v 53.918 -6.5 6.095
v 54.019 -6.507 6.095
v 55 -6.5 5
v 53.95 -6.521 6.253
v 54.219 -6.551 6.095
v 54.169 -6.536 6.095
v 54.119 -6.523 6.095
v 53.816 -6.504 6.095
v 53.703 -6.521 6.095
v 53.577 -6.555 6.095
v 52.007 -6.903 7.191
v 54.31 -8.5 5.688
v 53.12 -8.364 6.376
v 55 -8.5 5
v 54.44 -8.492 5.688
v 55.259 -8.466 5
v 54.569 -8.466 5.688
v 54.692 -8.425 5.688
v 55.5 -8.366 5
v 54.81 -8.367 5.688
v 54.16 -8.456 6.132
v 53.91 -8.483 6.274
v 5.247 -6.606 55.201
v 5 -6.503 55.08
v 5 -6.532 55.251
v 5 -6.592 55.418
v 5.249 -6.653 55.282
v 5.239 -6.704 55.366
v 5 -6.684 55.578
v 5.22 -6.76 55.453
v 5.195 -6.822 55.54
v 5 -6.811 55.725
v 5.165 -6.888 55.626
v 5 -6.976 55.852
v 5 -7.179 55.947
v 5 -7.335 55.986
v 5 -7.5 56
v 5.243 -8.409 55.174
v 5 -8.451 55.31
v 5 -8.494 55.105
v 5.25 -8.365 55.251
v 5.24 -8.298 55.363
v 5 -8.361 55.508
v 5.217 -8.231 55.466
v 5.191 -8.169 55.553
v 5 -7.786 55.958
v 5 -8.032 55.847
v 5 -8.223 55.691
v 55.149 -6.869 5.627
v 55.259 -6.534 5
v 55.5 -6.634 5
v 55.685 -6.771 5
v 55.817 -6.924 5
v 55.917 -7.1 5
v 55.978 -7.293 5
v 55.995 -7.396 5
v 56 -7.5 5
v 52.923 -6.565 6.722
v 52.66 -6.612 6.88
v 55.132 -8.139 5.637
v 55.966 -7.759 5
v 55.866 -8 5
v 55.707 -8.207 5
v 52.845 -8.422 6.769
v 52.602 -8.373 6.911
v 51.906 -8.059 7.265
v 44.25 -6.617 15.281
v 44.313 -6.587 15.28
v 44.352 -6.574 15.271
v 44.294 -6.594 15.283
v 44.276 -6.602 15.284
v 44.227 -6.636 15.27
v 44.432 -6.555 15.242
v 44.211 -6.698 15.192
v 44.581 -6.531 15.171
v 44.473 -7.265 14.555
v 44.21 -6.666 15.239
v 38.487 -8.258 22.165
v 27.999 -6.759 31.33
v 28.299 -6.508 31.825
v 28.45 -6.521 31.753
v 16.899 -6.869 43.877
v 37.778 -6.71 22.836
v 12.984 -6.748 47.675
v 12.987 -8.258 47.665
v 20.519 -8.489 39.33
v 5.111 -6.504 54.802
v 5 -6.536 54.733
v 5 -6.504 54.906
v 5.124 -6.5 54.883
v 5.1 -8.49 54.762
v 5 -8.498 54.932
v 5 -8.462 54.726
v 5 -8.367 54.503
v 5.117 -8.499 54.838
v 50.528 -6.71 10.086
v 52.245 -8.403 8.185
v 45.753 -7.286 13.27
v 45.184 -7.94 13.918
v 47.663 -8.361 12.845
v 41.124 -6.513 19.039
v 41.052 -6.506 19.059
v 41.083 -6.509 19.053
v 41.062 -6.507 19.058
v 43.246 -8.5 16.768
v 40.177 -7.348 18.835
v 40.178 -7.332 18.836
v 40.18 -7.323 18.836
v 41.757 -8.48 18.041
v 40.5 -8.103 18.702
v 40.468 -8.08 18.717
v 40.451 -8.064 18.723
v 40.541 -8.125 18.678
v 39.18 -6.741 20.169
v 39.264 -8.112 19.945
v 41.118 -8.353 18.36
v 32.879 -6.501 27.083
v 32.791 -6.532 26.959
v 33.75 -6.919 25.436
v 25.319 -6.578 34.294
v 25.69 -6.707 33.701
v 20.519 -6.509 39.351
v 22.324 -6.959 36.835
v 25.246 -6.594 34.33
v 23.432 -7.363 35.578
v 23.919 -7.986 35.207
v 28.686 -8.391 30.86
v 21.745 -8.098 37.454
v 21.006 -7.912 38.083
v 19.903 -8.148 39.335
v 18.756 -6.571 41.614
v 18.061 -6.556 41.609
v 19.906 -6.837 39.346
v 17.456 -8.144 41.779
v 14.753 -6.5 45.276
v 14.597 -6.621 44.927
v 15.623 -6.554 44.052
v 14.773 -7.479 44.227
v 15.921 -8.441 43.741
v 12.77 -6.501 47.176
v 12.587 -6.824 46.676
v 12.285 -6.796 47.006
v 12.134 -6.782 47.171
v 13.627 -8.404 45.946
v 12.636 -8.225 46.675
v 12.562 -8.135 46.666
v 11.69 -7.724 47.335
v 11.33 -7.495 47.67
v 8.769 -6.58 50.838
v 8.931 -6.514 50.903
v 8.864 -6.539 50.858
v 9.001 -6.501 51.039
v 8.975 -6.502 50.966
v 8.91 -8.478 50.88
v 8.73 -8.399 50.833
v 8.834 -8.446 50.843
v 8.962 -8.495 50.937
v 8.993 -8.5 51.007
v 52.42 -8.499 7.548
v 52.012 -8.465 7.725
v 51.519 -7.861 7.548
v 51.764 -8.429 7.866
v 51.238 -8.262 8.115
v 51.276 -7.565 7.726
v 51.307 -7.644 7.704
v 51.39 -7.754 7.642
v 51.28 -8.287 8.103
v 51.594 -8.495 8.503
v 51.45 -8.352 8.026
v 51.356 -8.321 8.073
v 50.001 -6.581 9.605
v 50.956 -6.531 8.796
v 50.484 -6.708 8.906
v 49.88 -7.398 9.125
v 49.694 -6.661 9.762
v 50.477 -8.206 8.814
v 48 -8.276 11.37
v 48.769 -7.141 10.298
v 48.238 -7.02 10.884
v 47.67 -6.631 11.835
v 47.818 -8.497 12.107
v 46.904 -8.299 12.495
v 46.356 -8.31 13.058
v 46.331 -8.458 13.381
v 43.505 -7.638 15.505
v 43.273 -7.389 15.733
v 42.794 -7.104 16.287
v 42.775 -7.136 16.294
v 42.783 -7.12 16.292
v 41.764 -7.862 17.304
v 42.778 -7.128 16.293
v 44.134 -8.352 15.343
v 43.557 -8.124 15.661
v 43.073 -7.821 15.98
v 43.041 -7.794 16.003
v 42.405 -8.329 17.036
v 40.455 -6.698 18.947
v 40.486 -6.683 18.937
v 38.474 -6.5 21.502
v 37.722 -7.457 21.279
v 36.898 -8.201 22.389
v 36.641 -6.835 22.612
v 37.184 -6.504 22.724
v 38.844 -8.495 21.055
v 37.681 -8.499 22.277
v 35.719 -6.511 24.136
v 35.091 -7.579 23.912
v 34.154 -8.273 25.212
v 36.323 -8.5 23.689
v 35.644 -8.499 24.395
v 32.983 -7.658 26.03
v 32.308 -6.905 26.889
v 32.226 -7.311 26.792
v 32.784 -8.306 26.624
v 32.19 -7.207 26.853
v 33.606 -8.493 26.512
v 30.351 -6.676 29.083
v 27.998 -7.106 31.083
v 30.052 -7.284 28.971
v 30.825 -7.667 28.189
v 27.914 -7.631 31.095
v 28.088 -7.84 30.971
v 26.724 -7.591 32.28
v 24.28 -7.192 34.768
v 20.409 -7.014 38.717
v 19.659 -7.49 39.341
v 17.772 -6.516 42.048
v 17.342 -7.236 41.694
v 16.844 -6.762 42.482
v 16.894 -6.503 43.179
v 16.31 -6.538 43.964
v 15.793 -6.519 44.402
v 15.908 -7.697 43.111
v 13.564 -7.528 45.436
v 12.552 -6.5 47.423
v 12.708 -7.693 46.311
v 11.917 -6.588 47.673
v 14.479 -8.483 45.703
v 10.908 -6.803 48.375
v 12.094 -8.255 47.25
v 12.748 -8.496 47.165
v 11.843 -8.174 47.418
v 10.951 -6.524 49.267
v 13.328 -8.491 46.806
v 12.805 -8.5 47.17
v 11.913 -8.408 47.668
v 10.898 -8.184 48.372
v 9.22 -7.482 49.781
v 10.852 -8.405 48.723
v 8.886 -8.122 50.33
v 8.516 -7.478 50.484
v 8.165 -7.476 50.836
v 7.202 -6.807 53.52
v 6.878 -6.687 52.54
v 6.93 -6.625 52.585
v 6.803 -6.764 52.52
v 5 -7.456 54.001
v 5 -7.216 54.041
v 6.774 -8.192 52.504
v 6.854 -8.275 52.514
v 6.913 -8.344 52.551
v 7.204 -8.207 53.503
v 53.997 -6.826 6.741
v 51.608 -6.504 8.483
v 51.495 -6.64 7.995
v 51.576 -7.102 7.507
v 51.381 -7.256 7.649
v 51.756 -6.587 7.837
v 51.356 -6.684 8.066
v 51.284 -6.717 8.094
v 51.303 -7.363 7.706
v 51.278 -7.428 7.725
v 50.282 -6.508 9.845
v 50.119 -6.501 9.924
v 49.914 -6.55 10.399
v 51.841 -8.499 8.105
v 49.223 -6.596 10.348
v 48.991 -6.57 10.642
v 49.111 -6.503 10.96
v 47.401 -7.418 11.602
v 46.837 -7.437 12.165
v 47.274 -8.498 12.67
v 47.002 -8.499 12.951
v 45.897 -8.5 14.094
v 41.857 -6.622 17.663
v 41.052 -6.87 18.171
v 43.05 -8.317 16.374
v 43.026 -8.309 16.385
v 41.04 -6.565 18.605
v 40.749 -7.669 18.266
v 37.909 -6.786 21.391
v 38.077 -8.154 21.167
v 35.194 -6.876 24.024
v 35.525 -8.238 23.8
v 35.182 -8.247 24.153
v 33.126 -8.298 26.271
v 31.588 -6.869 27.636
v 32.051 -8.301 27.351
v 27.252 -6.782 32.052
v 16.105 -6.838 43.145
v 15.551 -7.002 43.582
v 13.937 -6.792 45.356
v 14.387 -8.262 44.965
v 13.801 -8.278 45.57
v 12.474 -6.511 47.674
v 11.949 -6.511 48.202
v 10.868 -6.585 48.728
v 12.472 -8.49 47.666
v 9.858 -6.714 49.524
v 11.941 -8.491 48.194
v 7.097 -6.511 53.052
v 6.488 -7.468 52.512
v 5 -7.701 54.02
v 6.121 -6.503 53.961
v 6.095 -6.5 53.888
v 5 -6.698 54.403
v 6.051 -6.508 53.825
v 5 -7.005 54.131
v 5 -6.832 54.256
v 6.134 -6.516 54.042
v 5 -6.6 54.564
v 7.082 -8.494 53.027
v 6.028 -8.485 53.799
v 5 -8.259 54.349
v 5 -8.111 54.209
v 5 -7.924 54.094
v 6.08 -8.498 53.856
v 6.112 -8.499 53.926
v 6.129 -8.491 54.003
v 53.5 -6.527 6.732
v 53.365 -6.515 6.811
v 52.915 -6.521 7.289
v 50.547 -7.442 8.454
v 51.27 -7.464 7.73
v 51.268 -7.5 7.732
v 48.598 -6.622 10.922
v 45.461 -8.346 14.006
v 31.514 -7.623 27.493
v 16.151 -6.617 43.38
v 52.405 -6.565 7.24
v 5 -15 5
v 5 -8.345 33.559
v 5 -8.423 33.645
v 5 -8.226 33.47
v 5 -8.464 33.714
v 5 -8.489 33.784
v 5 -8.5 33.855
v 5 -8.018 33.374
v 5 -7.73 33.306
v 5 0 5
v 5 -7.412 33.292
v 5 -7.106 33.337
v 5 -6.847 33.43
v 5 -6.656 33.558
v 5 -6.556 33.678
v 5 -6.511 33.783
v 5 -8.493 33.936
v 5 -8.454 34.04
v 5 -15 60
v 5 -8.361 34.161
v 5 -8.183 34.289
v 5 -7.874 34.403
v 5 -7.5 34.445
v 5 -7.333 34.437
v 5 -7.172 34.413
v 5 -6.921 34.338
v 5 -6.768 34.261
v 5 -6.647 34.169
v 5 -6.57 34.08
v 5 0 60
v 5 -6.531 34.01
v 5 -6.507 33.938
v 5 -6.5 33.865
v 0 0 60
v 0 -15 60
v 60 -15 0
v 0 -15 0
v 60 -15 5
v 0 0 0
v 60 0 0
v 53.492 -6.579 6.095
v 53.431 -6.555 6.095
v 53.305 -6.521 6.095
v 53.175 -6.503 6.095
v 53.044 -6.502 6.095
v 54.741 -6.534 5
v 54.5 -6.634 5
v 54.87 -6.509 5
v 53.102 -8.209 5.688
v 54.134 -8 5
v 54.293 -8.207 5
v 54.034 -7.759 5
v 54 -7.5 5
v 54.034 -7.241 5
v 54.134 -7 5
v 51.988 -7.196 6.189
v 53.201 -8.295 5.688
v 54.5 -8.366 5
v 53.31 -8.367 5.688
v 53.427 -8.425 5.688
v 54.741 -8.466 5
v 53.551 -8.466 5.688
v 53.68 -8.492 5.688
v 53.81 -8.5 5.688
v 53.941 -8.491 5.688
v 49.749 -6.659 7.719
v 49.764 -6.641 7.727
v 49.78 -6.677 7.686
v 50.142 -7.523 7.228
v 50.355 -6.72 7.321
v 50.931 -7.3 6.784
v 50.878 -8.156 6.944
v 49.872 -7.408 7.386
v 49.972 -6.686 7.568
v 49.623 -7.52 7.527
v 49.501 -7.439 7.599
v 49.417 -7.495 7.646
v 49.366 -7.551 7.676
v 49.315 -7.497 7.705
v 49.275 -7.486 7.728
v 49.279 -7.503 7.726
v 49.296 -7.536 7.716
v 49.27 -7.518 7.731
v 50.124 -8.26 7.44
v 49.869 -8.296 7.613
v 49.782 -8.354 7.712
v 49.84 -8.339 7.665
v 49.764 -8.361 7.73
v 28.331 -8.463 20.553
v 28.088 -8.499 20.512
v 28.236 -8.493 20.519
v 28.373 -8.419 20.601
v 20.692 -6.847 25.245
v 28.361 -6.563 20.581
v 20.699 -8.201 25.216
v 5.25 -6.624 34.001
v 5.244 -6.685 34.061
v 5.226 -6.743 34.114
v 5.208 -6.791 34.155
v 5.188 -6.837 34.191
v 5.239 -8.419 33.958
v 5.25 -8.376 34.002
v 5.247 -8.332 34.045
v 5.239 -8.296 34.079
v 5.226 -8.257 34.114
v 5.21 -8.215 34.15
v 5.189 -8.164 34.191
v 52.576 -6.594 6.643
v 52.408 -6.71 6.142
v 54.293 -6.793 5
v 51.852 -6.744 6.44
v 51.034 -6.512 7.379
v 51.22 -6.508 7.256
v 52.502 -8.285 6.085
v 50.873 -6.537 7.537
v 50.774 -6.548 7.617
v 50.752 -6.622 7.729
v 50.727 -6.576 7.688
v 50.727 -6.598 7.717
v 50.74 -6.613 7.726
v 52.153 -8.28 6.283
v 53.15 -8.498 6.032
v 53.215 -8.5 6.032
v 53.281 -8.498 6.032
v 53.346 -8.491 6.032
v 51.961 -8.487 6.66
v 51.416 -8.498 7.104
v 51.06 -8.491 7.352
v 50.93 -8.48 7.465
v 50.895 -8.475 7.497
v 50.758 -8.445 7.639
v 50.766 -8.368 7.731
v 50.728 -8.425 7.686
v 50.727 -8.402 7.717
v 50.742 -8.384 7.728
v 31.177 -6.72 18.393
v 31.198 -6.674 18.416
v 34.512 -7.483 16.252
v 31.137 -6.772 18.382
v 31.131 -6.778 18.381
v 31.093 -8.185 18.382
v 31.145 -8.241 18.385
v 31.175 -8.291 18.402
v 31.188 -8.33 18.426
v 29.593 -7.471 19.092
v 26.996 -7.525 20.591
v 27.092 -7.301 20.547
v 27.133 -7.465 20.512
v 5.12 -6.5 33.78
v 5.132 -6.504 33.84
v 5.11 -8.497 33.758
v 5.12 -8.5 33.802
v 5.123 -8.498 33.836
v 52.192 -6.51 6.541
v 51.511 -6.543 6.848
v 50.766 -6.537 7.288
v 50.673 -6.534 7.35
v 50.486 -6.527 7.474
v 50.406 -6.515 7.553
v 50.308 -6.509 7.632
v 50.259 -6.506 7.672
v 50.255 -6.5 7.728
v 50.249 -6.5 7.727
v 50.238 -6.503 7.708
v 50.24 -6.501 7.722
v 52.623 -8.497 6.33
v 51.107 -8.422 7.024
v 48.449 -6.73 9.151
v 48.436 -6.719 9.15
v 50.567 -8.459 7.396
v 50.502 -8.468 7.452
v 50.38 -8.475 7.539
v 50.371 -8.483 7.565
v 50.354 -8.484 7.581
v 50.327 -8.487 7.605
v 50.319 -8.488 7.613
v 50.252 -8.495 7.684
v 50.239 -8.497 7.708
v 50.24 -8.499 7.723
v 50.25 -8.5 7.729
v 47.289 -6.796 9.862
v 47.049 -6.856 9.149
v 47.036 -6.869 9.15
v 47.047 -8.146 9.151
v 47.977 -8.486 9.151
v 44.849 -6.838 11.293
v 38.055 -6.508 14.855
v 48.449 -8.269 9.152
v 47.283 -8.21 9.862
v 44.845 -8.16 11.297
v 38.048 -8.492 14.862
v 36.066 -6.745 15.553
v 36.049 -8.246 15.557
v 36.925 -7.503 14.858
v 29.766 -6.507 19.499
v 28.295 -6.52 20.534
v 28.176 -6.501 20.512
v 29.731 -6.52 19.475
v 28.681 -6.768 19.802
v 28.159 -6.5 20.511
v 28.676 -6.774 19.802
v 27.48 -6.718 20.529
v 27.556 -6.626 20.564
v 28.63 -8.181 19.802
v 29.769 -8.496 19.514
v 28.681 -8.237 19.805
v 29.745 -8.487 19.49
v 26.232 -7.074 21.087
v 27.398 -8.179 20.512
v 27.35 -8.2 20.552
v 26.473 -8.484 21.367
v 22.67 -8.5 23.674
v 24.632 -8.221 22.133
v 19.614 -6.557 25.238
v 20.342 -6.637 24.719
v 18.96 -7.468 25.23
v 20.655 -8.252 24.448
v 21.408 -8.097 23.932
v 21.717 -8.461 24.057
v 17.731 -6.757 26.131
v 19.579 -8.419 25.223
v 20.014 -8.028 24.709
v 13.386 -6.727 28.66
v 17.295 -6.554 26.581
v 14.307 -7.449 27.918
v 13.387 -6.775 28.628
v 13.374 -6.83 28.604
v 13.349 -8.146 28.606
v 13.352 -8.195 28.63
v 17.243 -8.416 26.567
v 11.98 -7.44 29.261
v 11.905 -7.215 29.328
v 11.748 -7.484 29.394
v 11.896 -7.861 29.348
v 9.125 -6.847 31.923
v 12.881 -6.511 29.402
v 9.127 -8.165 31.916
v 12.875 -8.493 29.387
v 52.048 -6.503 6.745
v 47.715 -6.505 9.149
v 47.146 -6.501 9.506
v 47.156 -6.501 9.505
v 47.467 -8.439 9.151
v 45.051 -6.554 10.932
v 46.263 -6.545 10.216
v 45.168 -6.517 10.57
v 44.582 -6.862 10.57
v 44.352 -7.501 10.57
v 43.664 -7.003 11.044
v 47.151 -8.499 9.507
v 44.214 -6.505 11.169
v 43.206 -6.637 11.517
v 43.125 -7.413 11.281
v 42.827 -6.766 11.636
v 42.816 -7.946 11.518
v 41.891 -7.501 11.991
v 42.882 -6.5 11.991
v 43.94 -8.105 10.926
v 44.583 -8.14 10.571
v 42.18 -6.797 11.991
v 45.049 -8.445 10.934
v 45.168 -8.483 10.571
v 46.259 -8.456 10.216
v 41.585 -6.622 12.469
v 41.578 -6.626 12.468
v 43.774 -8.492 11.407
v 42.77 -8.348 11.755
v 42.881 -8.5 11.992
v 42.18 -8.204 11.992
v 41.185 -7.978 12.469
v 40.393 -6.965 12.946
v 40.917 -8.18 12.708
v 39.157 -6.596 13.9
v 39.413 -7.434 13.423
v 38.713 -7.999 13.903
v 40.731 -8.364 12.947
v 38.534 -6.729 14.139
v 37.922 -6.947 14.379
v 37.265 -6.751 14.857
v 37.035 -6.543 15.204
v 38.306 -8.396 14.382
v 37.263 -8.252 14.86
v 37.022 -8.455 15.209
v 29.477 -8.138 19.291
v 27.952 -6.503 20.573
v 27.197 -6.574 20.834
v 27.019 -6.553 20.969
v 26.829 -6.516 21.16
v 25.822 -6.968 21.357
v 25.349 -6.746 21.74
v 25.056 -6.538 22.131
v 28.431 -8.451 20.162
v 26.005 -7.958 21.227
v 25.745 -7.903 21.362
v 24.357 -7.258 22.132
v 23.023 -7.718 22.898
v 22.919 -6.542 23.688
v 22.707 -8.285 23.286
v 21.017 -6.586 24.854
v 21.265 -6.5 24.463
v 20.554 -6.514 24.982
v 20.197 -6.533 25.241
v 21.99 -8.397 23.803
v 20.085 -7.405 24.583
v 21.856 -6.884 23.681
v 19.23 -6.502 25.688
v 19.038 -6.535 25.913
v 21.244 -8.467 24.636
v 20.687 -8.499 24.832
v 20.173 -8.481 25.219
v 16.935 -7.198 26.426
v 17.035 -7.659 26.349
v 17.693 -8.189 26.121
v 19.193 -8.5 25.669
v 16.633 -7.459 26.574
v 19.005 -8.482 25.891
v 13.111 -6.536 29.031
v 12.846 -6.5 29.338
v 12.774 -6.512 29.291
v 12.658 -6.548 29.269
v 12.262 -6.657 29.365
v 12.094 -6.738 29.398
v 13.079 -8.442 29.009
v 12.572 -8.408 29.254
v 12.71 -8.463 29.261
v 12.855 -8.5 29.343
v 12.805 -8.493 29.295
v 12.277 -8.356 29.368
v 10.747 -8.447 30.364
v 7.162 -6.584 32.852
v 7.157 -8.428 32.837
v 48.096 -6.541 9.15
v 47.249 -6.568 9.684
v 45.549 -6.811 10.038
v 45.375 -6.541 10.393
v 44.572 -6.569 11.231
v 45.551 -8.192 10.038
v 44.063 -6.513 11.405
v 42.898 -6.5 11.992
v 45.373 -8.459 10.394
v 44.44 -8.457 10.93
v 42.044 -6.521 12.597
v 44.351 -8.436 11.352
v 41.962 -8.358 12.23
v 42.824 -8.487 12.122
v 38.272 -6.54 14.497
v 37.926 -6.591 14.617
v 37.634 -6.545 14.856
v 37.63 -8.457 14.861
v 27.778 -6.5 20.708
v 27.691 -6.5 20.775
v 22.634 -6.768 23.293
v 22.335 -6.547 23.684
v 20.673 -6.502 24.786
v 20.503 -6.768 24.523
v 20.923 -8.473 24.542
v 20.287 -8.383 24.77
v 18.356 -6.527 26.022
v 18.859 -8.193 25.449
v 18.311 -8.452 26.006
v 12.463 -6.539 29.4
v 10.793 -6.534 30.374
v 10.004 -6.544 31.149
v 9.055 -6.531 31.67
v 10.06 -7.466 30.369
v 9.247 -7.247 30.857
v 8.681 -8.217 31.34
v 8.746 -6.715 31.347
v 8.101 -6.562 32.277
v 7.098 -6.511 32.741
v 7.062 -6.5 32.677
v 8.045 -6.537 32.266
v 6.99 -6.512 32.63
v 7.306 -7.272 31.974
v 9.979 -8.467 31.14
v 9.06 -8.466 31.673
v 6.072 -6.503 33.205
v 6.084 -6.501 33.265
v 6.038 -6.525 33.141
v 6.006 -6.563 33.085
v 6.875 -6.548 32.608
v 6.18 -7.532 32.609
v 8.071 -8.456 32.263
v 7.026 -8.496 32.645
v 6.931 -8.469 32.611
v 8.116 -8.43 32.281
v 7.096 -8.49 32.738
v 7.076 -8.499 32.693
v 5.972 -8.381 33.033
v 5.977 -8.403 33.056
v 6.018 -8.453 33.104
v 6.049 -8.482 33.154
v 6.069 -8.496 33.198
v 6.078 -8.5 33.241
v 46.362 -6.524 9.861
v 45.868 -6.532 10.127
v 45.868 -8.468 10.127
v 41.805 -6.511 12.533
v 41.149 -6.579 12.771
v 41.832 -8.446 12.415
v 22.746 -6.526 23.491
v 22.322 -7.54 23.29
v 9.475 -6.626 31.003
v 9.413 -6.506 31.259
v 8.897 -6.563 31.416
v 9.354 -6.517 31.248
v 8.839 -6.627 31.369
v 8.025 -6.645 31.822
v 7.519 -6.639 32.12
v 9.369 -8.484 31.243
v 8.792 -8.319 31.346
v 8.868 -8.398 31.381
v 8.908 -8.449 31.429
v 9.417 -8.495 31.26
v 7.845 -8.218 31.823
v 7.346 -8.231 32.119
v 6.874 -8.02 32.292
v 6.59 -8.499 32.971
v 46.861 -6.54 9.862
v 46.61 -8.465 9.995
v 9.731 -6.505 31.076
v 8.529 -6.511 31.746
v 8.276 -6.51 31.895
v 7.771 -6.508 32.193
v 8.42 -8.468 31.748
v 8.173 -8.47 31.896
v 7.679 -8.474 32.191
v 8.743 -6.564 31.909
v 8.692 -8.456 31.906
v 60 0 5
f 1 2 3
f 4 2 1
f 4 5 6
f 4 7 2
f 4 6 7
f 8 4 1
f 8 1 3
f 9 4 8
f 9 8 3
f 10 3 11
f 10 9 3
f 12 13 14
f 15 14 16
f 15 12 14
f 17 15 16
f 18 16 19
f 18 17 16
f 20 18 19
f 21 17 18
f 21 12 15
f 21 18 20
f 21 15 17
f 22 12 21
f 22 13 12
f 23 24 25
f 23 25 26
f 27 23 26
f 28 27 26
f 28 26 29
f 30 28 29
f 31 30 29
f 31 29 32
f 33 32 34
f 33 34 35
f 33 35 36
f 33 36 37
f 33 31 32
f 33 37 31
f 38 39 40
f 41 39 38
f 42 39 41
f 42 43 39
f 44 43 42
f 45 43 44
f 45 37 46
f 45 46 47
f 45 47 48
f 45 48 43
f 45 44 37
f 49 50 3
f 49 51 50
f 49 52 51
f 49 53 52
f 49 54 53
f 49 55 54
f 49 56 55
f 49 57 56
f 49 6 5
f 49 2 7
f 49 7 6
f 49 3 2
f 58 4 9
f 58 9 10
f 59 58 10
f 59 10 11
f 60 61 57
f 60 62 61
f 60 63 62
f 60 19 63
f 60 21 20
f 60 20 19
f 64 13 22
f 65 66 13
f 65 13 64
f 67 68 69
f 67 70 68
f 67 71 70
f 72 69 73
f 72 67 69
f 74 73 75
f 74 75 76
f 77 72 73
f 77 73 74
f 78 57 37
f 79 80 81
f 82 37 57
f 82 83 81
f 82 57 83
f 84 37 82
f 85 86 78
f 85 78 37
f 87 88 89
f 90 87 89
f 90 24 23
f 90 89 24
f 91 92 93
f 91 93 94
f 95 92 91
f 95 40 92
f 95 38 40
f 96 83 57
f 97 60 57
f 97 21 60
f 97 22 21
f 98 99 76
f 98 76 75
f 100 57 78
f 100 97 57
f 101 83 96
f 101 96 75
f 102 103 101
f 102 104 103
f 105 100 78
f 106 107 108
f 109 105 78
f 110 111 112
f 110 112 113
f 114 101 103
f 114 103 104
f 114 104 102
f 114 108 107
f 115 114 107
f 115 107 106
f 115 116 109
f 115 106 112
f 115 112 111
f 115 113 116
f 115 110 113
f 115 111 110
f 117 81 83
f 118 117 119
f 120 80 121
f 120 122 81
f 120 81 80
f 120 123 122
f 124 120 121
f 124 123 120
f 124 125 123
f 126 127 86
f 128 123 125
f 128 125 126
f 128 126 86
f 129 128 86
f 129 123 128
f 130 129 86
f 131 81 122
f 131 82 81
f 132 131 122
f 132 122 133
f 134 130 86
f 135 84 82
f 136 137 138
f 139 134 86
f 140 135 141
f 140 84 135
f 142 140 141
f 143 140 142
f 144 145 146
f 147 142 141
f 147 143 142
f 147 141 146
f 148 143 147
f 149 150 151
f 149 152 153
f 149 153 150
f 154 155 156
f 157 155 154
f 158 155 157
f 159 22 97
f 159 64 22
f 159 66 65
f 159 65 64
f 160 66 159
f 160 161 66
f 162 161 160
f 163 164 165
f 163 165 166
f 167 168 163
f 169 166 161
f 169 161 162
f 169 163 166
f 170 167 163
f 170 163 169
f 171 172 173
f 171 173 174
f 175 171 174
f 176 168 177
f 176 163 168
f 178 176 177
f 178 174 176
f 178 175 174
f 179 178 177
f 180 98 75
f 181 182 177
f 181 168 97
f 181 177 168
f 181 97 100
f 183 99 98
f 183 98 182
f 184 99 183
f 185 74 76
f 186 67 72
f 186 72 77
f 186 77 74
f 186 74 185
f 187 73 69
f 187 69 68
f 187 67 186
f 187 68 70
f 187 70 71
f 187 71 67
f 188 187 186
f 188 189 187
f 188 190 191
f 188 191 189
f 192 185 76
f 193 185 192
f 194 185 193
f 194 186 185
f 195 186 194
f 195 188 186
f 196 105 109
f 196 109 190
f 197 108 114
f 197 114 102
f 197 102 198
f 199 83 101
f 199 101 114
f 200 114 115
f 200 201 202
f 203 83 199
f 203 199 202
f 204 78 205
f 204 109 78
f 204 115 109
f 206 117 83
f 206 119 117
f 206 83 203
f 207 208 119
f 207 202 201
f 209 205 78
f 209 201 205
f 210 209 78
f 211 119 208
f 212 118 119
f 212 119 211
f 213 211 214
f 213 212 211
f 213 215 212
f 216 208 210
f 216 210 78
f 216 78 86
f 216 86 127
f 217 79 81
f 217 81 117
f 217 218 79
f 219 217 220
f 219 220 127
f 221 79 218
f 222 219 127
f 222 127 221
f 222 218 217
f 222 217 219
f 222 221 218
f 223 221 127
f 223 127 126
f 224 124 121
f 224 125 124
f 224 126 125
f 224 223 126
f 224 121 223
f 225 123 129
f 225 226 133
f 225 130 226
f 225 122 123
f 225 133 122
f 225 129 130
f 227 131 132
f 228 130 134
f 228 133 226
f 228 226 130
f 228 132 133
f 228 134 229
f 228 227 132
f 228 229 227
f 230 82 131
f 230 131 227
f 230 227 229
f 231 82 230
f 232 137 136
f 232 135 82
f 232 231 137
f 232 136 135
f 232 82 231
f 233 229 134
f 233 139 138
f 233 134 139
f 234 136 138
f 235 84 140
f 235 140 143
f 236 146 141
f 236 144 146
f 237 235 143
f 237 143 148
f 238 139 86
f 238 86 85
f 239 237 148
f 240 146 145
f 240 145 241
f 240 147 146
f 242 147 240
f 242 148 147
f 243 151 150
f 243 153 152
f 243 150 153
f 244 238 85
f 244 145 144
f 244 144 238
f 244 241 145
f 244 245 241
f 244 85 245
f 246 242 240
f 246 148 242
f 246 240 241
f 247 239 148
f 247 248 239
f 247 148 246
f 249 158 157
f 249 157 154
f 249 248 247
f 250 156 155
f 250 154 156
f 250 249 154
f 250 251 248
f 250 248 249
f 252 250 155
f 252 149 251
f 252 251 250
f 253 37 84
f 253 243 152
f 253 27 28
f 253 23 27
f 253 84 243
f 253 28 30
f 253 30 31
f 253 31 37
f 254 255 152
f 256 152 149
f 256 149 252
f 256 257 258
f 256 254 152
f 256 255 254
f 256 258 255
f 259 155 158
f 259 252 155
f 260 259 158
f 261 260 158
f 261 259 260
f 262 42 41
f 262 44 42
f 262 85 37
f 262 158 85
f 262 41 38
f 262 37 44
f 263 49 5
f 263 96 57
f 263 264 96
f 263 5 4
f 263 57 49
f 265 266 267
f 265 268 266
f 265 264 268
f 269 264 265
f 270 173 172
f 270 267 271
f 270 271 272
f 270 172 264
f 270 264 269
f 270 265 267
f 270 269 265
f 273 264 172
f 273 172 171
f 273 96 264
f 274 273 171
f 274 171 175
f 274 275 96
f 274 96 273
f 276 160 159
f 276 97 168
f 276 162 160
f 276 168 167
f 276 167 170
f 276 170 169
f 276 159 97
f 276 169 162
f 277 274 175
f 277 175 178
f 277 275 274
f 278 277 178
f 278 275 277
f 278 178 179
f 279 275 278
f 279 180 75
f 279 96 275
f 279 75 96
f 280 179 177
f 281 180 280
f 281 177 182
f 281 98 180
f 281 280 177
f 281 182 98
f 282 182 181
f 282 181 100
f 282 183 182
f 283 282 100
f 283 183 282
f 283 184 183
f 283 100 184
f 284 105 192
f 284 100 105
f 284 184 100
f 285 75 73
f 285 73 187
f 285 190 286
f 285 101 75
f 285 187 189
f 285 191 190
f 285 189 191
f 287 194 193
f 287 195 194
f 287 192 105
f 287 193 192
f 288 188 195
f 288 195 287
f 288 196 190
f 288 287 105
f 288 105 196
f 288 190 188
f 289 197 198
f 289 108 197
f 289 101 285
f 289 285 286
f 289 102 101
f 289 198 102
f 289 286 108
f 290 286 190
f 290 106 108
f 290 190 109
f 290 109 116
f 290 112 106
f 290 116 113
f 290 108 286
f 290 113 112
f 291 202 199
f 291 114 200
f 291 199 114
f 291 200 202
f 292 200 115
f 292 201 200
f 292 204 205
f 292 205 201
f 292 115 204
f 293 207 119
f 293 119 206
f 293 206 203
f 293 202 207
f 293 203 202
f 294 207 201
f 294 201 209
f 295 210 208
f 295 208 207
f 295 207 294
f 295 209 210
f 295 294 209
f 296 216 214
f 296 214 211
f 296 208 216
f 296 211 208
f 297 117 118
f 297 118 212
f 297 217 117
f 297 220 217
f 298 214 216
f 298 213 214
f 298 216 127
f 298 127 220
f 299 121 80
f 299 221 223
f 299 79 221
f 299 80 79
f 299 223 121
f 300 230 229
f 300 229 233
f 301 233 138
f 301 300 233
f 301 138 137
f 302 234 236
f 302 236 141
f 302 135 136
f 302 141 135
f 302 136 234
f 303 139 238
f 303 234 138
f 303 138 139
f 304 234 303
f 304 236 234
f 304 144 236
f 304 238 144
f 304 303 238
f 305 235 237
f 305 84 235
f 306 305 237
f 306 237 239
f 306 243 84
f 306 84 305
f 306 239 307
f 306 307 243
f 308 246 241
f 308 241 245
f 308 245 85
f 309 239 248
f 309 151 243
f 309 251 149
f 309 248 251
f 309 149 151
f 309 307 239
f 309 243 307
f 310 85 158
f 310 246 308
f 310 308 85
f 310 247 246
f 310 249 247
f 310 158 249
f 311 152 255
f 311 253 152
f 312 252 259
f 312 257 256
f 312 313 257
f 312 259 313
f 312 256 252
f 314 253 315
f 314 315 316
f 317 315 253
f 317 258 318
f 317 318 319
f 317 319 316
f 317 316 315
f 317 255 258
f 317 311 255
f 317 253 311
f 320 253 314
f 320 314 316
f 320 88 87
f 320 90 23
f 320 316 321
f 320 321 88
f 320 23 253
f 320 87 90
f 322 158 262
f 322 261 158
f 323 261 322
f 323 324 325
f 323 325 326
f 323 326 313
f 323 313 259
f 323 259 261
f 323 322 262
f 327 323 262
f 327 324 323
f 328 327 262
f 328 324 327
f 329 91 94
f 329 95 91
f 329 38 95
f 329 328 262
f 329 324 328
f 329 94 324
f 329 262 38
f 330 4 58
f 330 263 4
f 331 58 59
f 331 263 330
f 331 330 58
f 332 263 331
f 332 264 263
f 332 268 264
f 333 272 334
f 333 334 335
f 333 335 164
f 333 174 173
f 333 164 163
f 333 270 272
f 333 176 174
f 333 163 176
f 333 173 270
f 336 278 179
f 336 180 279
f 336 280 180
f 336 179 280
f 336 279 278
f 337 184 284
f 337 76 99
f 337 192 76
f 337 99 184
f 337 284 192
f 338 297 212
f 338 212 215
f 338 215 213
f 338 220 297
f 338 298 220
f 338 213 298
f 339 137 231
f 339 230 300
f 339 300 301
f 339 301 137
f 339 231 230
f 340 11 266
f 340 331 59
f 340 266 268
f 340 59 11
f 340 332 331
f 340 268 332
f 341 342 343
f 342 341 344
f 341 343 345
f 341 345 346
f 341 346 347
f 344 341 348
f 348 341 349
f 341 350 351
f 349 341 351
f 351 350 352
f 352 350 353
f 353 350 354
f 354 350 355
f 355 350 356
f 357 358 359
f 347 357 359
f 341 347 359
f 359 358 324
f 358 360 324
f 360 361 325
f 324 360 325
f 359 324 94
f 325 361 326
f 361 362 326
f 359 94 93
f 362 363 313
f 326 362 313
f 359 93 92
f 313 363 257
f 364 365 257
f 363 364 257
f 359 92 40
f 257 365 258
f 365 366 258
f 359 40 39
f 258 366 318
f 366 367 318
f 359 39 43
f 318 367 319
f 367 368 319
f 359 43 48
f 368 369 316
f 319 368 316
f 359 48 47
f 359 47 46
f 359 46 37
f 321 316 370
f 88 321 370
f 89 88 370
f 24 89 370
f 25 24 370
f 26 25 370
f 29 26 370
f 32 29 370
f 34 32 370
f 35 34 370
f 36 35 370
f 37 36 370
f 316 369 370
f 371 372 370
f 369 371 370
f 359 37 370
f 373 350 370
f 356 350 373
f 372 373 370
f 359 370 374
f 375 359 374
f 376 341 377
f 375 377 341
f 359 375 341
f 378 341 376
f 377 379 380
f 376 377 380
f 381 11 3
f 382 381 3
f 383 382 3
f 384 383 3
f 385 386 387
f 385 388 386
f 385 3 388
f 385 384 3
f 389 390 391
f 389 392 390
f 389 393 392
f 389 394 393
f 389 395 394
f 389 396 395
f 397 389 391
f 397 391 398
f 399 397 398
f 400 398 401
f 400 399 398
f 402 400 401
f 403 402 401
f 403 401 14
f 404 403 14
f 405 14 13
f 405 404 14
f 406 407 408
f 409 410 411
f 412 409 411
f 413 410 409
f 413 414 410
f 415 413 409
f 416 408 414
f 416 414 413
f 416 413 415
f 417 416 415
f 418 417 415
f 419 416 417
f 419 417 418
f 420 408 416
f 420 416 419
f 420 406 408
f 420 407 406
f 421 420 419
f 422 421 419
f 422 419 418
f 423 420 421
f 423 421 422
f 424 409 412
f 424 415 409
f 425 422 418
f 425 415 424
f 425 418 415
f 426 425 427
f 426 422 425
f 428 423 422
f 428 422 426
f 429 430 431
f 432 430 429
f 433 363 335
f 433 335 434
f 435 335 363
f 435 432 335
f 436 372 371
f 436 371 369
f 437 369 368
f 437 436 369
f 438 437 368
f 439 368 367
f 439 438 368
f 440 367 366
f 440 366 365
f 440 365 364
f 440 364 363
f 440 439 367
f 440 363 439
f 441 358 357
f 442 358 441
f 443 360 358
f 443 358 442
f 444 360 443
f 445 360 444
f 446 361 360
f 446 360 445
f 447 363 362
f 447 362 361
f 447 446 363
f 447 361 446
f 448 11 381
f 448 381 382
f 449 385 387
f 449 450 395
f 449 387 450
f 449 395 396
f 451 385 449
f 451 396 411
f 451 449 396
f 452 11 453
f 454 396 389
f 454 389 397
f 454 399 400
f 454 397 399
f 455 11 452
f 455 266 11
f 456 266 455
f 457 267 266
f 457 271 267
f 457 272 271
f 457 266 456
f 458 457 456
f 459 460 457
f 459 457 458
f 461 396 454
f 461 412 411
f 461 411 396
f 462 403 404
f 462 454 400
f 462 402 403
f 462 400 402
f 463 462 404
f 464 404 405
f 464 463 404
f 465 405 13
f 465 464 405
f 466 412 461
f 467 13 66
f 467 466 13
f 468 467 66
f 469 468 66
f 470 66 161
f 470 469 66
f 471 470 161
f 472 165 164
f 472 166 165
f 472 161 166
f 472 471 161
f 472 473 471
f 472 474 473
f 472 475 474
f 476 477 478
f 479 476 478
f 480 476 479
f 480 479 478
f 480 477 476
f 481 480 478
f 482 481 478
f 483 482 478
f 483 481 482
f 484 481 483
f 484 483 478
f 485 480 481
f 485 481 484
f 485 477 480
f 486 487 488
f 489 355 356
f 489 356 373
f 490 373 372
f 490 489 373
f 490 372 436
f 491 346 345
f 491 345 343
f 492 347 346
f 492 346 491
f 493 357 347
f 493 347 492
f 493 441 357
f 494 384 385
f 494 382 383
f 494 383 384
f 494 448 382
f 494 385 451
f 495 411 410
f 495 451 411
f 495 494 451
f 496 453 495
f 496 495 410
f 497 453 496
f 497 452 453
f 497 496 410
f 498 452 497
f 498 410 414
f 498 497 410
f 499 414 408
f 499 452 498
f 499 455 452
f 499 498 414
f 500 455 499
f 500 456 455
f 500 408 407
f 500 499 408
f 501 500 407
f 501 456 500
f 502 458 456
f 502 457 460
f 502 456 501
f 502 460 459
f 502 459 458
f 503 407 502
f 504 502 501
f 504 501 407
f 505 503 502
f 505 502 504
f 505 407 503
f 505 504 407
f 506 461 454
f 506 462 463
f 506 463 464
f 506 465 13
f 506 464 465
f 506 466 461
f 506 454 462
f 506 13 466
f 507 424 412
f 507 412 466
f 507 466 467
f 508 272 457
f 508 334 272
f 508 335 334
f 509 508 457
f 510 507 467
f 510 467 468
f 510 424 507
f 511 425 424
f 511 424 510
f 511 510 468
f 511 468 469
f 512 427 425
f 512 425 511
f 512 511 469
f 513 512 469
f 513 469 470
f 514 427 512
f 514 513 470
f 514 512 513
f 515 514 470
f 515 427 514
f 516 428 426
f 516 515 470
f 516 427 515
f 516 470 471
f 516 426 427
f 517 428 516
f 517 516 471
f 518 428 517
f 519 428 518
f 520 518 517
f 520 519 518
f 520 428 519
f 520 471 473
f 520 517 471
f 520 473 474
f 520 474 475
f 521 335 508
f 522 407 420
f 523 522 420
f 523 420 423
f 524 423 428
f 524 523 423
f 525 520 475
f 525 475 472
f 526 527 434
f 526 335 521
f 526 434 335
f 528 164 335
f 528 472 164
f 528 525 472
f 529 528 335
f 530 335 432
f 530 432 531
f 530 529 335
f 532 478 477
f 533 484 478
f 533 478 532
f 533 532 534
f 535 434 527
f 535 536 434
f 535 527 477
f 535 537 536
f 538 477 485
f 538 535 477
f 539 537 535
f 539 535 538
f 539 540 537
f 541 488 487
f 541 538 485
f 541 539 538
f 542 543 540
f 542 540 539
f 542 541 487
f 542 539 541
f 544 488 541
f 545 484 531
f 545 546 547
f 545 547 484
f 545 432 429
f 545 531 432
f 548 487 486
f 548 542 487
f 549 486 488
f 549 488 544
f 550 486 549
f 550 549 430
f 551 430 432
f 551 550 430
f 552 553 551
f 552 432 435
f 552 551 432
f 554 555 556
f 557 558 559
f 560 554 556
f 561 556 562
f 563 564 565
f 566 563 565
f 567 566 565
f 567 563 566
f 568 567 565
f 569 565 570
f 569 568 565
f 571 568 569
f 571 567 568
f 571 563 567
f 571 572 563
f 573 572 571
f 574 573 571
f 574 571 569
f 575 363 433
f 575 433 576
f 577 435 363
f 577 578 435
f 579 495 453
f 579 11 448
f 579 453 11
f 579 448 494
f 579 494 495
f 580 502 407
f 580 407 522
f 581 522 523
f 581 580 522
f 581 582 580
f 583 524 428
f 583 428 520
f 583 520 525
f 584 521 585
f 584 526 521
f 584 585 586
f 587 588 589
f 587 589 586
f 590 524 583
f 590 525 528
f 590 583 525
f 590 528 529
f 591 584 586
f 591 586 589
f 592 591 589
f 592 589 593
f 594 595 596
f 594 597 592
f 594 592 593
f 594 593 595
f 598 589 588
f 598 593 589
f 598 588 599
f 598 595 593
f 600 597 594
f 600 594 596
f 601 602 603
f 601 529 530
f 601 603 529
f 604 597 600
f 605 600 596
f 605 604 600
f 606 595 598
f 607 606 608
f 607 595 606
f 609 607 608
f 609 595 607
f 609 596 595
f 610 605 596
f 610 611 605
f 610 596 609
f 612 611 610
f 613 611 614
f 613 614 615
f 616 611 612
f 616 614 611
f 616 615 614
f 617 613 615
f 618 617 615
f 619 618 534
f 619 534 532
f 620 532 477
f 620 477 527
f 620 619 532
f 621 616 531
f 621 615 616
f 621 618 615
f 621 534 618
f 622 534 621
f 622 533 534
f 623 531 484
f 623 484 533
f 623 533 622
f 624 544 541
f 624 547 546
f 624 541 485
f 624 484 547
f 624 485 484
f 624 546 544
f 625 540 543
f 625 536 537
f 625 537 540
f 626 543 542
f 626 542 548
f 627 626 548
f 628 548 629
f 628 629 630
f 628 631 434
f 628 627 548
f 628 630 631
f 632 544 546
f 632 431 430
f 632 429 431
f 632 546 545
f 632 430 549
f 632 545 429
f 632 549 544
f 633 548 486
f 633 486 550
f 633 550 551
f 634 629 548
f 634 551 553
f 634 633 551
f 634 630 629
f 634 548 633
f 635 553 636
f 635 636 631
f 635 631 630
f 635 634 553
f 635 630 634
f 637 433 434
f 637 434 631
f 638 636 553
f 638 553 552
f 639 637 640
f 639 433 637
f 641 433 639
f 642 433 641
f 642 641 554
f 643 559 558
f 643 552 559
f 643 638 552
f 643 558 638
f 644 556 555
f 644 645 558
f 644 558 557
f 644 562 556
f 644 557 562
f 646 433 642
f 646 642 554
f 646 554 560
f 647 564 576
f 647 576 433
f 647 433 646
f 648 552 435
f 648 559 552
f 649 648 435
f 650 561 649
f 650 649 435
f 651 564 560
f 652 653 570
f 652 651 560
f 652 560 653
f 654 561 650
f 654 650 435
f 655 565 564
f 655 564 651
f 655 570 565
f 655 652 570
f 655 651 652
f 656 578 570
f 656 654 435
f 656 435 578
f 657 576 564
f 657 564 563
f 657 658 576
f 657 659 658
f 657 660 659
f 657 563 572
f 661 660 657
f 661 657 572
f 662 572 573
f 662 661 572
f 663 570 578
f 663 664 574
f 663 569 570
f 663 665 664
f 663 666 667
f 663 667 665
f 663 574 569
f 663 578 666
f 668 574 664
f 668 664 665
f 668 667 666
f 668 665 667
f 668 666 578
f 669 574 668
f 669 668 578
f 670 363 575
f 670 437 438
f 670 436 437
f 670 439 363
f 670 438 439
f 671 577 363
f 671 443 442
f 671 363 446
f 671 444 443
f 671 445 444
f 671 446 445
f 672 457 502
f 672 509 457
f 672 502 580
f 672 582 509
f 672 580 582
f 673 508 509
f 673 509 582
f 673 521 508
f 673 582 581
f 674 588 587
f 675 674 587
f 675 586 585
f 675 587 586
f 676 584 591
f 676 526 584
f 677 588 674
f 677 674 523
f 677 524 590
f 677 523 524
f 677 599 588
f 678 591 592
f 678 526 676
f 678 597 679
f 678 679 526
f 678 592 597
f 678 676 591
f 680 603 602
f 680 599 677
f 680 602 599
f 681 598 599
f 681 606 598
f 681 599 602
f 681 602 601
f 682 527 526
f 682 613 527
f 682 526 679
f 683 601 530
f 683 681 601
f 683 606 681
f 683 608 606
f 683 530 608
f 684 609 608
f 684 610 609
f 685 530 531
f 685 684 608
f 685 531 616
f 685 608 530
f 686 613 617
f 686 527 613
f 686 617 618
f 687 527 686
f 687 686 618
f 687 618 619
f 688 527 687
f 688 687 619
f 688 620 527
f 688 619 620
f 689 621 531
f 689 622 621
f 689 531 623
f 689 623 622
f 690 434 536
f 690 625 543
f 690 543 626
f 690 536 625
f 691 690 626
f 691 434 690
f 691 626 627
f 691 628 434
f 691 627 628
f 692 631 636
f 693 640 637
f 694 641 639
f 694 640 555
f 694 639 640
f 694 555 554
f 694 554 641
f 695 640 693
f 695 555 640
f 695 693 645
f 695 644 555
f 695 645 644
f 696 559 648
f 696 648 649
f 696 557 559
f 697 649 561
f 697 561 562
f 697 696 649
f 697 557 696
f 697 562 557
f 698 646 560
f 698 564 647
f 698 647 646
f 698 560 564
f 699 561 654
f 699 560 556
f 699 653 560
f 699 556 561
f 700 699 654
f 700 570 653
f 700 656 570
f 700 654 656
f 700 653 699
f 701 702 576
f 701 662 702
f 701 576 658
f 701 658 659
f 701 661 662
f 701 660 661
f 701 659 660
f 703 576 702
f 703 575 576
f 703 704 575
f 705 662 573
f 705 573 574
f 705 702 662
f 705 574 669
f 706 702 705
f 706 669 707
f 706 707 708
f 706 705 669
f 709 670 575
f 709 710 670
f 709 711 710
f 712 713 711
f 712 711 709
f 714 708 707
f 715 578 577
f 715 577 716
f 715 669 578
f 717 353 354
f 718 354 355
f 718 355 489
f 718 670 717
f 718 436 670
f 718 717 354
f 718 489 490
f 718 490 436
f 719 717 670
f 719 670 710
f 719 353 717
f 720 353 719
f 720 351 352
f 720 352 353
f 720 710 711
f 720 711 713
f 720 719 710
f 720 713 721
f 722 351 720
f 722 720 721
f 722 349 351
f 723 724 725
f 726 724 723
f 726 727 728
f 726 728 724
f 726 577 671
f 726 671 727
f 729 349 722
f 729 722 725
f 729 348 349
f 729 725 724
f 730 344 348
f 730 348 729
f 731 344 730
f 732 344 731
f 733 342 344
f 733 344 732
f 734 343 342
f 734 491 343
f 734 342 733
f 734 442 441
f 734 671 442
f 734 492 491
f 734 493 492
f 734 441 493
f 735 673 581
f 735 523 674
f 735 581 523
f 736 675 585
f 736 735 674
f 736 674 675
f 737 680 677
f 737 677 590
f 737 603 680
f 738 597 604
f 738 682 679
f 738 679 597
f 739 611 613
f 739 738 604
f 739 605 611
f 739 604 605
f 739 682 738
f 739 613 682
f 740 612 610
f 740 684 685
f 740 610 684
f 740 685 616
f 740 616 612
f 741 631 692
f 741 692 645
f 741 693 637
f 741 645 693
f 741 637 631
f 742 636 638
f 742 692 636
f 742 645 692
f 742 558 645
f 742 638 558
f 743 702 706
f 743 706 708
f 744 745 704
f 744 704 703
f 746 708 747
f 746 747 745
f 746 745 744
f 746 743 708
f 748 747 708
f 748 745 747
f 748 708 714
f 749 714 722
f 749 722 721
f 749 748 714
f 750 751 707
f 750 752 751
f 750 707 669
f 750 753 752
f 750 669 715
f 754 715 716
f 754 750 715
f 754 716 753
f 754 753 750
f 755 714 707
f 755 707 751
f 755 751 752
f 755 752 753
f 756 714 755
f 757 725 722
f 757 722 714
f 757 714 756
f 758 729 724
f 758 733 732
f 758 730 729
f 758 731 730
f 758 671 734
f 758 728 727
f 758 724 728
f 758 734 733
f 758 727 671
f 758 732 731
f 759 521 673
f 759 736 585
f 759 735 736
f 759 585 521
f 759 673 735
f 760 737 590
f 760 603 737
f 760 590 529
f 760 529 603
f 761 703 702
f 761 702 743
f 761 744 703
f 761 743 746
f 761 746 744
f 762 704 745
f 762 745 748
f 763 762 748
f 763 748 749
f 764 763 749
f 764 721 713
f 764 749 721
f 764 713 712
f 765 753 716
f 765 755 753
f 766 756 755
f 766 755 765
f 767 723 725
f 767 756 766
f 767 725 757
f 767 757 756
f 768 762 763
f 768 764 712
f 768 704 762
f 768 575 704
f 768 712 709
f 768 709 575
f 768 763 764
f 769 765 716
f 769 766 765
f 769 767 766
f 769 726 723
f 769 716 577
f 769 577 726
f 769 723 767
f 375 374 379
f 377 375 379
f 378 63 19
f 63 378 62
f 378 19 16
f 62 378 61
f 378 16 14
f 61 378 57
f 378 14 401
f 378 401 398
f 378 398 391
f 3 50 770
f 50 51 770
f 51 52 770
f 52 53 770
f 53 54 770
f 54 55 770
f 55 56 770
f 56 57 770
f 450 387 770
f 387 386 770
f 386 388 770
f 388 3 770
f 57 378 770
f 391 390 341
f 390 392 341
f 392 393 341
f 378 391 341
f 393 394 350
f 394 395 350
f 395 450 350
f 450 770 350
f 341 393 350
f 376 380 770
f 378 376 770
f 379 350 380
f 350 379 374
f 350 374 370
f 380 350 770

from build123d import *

# Parameters (mm, degrees)
F1_DEPTH = 15
F2_R     = 1


with BuildPart() as f1:
    # F0 (on Front) → F1 (new body)
    with BuildSketch(Plane.XZ):
        Polygon((0, 5), (0, 0), (5, 0), (60, 0), (60, 5), (5, 5), (5, 60), (0, 60), align=None)
    extrude(amount=F1_DEPTH)

    # F4: sweep along a path in F3
    with BuildLine(Plane.XZ) as f4_path:
        Line((55, 3), (1.966991411, 56.033008589))
    # F2 (on face) → F4 (sweep)
    with BuildSketch(Plane.XY.offset(5)):
        with Locations((55, -7.5)):
            Circle(F2_R)
    sweep(path=f4_path.line)

    # F6: sweep along a path in F5
    with BuildLine(Plane.XZ) as f6_path:
        Line((54.6012308025, 5), (2.6397065754, 35))
    # F2 (on face) → F6 (sweep)
    with BuildSketch(Plane.XY.offset(5)):
        with Locations((55, -7.5)):
            Circle(F2_R)
    sweep(path=f6_path.line)


solid = f1.part
